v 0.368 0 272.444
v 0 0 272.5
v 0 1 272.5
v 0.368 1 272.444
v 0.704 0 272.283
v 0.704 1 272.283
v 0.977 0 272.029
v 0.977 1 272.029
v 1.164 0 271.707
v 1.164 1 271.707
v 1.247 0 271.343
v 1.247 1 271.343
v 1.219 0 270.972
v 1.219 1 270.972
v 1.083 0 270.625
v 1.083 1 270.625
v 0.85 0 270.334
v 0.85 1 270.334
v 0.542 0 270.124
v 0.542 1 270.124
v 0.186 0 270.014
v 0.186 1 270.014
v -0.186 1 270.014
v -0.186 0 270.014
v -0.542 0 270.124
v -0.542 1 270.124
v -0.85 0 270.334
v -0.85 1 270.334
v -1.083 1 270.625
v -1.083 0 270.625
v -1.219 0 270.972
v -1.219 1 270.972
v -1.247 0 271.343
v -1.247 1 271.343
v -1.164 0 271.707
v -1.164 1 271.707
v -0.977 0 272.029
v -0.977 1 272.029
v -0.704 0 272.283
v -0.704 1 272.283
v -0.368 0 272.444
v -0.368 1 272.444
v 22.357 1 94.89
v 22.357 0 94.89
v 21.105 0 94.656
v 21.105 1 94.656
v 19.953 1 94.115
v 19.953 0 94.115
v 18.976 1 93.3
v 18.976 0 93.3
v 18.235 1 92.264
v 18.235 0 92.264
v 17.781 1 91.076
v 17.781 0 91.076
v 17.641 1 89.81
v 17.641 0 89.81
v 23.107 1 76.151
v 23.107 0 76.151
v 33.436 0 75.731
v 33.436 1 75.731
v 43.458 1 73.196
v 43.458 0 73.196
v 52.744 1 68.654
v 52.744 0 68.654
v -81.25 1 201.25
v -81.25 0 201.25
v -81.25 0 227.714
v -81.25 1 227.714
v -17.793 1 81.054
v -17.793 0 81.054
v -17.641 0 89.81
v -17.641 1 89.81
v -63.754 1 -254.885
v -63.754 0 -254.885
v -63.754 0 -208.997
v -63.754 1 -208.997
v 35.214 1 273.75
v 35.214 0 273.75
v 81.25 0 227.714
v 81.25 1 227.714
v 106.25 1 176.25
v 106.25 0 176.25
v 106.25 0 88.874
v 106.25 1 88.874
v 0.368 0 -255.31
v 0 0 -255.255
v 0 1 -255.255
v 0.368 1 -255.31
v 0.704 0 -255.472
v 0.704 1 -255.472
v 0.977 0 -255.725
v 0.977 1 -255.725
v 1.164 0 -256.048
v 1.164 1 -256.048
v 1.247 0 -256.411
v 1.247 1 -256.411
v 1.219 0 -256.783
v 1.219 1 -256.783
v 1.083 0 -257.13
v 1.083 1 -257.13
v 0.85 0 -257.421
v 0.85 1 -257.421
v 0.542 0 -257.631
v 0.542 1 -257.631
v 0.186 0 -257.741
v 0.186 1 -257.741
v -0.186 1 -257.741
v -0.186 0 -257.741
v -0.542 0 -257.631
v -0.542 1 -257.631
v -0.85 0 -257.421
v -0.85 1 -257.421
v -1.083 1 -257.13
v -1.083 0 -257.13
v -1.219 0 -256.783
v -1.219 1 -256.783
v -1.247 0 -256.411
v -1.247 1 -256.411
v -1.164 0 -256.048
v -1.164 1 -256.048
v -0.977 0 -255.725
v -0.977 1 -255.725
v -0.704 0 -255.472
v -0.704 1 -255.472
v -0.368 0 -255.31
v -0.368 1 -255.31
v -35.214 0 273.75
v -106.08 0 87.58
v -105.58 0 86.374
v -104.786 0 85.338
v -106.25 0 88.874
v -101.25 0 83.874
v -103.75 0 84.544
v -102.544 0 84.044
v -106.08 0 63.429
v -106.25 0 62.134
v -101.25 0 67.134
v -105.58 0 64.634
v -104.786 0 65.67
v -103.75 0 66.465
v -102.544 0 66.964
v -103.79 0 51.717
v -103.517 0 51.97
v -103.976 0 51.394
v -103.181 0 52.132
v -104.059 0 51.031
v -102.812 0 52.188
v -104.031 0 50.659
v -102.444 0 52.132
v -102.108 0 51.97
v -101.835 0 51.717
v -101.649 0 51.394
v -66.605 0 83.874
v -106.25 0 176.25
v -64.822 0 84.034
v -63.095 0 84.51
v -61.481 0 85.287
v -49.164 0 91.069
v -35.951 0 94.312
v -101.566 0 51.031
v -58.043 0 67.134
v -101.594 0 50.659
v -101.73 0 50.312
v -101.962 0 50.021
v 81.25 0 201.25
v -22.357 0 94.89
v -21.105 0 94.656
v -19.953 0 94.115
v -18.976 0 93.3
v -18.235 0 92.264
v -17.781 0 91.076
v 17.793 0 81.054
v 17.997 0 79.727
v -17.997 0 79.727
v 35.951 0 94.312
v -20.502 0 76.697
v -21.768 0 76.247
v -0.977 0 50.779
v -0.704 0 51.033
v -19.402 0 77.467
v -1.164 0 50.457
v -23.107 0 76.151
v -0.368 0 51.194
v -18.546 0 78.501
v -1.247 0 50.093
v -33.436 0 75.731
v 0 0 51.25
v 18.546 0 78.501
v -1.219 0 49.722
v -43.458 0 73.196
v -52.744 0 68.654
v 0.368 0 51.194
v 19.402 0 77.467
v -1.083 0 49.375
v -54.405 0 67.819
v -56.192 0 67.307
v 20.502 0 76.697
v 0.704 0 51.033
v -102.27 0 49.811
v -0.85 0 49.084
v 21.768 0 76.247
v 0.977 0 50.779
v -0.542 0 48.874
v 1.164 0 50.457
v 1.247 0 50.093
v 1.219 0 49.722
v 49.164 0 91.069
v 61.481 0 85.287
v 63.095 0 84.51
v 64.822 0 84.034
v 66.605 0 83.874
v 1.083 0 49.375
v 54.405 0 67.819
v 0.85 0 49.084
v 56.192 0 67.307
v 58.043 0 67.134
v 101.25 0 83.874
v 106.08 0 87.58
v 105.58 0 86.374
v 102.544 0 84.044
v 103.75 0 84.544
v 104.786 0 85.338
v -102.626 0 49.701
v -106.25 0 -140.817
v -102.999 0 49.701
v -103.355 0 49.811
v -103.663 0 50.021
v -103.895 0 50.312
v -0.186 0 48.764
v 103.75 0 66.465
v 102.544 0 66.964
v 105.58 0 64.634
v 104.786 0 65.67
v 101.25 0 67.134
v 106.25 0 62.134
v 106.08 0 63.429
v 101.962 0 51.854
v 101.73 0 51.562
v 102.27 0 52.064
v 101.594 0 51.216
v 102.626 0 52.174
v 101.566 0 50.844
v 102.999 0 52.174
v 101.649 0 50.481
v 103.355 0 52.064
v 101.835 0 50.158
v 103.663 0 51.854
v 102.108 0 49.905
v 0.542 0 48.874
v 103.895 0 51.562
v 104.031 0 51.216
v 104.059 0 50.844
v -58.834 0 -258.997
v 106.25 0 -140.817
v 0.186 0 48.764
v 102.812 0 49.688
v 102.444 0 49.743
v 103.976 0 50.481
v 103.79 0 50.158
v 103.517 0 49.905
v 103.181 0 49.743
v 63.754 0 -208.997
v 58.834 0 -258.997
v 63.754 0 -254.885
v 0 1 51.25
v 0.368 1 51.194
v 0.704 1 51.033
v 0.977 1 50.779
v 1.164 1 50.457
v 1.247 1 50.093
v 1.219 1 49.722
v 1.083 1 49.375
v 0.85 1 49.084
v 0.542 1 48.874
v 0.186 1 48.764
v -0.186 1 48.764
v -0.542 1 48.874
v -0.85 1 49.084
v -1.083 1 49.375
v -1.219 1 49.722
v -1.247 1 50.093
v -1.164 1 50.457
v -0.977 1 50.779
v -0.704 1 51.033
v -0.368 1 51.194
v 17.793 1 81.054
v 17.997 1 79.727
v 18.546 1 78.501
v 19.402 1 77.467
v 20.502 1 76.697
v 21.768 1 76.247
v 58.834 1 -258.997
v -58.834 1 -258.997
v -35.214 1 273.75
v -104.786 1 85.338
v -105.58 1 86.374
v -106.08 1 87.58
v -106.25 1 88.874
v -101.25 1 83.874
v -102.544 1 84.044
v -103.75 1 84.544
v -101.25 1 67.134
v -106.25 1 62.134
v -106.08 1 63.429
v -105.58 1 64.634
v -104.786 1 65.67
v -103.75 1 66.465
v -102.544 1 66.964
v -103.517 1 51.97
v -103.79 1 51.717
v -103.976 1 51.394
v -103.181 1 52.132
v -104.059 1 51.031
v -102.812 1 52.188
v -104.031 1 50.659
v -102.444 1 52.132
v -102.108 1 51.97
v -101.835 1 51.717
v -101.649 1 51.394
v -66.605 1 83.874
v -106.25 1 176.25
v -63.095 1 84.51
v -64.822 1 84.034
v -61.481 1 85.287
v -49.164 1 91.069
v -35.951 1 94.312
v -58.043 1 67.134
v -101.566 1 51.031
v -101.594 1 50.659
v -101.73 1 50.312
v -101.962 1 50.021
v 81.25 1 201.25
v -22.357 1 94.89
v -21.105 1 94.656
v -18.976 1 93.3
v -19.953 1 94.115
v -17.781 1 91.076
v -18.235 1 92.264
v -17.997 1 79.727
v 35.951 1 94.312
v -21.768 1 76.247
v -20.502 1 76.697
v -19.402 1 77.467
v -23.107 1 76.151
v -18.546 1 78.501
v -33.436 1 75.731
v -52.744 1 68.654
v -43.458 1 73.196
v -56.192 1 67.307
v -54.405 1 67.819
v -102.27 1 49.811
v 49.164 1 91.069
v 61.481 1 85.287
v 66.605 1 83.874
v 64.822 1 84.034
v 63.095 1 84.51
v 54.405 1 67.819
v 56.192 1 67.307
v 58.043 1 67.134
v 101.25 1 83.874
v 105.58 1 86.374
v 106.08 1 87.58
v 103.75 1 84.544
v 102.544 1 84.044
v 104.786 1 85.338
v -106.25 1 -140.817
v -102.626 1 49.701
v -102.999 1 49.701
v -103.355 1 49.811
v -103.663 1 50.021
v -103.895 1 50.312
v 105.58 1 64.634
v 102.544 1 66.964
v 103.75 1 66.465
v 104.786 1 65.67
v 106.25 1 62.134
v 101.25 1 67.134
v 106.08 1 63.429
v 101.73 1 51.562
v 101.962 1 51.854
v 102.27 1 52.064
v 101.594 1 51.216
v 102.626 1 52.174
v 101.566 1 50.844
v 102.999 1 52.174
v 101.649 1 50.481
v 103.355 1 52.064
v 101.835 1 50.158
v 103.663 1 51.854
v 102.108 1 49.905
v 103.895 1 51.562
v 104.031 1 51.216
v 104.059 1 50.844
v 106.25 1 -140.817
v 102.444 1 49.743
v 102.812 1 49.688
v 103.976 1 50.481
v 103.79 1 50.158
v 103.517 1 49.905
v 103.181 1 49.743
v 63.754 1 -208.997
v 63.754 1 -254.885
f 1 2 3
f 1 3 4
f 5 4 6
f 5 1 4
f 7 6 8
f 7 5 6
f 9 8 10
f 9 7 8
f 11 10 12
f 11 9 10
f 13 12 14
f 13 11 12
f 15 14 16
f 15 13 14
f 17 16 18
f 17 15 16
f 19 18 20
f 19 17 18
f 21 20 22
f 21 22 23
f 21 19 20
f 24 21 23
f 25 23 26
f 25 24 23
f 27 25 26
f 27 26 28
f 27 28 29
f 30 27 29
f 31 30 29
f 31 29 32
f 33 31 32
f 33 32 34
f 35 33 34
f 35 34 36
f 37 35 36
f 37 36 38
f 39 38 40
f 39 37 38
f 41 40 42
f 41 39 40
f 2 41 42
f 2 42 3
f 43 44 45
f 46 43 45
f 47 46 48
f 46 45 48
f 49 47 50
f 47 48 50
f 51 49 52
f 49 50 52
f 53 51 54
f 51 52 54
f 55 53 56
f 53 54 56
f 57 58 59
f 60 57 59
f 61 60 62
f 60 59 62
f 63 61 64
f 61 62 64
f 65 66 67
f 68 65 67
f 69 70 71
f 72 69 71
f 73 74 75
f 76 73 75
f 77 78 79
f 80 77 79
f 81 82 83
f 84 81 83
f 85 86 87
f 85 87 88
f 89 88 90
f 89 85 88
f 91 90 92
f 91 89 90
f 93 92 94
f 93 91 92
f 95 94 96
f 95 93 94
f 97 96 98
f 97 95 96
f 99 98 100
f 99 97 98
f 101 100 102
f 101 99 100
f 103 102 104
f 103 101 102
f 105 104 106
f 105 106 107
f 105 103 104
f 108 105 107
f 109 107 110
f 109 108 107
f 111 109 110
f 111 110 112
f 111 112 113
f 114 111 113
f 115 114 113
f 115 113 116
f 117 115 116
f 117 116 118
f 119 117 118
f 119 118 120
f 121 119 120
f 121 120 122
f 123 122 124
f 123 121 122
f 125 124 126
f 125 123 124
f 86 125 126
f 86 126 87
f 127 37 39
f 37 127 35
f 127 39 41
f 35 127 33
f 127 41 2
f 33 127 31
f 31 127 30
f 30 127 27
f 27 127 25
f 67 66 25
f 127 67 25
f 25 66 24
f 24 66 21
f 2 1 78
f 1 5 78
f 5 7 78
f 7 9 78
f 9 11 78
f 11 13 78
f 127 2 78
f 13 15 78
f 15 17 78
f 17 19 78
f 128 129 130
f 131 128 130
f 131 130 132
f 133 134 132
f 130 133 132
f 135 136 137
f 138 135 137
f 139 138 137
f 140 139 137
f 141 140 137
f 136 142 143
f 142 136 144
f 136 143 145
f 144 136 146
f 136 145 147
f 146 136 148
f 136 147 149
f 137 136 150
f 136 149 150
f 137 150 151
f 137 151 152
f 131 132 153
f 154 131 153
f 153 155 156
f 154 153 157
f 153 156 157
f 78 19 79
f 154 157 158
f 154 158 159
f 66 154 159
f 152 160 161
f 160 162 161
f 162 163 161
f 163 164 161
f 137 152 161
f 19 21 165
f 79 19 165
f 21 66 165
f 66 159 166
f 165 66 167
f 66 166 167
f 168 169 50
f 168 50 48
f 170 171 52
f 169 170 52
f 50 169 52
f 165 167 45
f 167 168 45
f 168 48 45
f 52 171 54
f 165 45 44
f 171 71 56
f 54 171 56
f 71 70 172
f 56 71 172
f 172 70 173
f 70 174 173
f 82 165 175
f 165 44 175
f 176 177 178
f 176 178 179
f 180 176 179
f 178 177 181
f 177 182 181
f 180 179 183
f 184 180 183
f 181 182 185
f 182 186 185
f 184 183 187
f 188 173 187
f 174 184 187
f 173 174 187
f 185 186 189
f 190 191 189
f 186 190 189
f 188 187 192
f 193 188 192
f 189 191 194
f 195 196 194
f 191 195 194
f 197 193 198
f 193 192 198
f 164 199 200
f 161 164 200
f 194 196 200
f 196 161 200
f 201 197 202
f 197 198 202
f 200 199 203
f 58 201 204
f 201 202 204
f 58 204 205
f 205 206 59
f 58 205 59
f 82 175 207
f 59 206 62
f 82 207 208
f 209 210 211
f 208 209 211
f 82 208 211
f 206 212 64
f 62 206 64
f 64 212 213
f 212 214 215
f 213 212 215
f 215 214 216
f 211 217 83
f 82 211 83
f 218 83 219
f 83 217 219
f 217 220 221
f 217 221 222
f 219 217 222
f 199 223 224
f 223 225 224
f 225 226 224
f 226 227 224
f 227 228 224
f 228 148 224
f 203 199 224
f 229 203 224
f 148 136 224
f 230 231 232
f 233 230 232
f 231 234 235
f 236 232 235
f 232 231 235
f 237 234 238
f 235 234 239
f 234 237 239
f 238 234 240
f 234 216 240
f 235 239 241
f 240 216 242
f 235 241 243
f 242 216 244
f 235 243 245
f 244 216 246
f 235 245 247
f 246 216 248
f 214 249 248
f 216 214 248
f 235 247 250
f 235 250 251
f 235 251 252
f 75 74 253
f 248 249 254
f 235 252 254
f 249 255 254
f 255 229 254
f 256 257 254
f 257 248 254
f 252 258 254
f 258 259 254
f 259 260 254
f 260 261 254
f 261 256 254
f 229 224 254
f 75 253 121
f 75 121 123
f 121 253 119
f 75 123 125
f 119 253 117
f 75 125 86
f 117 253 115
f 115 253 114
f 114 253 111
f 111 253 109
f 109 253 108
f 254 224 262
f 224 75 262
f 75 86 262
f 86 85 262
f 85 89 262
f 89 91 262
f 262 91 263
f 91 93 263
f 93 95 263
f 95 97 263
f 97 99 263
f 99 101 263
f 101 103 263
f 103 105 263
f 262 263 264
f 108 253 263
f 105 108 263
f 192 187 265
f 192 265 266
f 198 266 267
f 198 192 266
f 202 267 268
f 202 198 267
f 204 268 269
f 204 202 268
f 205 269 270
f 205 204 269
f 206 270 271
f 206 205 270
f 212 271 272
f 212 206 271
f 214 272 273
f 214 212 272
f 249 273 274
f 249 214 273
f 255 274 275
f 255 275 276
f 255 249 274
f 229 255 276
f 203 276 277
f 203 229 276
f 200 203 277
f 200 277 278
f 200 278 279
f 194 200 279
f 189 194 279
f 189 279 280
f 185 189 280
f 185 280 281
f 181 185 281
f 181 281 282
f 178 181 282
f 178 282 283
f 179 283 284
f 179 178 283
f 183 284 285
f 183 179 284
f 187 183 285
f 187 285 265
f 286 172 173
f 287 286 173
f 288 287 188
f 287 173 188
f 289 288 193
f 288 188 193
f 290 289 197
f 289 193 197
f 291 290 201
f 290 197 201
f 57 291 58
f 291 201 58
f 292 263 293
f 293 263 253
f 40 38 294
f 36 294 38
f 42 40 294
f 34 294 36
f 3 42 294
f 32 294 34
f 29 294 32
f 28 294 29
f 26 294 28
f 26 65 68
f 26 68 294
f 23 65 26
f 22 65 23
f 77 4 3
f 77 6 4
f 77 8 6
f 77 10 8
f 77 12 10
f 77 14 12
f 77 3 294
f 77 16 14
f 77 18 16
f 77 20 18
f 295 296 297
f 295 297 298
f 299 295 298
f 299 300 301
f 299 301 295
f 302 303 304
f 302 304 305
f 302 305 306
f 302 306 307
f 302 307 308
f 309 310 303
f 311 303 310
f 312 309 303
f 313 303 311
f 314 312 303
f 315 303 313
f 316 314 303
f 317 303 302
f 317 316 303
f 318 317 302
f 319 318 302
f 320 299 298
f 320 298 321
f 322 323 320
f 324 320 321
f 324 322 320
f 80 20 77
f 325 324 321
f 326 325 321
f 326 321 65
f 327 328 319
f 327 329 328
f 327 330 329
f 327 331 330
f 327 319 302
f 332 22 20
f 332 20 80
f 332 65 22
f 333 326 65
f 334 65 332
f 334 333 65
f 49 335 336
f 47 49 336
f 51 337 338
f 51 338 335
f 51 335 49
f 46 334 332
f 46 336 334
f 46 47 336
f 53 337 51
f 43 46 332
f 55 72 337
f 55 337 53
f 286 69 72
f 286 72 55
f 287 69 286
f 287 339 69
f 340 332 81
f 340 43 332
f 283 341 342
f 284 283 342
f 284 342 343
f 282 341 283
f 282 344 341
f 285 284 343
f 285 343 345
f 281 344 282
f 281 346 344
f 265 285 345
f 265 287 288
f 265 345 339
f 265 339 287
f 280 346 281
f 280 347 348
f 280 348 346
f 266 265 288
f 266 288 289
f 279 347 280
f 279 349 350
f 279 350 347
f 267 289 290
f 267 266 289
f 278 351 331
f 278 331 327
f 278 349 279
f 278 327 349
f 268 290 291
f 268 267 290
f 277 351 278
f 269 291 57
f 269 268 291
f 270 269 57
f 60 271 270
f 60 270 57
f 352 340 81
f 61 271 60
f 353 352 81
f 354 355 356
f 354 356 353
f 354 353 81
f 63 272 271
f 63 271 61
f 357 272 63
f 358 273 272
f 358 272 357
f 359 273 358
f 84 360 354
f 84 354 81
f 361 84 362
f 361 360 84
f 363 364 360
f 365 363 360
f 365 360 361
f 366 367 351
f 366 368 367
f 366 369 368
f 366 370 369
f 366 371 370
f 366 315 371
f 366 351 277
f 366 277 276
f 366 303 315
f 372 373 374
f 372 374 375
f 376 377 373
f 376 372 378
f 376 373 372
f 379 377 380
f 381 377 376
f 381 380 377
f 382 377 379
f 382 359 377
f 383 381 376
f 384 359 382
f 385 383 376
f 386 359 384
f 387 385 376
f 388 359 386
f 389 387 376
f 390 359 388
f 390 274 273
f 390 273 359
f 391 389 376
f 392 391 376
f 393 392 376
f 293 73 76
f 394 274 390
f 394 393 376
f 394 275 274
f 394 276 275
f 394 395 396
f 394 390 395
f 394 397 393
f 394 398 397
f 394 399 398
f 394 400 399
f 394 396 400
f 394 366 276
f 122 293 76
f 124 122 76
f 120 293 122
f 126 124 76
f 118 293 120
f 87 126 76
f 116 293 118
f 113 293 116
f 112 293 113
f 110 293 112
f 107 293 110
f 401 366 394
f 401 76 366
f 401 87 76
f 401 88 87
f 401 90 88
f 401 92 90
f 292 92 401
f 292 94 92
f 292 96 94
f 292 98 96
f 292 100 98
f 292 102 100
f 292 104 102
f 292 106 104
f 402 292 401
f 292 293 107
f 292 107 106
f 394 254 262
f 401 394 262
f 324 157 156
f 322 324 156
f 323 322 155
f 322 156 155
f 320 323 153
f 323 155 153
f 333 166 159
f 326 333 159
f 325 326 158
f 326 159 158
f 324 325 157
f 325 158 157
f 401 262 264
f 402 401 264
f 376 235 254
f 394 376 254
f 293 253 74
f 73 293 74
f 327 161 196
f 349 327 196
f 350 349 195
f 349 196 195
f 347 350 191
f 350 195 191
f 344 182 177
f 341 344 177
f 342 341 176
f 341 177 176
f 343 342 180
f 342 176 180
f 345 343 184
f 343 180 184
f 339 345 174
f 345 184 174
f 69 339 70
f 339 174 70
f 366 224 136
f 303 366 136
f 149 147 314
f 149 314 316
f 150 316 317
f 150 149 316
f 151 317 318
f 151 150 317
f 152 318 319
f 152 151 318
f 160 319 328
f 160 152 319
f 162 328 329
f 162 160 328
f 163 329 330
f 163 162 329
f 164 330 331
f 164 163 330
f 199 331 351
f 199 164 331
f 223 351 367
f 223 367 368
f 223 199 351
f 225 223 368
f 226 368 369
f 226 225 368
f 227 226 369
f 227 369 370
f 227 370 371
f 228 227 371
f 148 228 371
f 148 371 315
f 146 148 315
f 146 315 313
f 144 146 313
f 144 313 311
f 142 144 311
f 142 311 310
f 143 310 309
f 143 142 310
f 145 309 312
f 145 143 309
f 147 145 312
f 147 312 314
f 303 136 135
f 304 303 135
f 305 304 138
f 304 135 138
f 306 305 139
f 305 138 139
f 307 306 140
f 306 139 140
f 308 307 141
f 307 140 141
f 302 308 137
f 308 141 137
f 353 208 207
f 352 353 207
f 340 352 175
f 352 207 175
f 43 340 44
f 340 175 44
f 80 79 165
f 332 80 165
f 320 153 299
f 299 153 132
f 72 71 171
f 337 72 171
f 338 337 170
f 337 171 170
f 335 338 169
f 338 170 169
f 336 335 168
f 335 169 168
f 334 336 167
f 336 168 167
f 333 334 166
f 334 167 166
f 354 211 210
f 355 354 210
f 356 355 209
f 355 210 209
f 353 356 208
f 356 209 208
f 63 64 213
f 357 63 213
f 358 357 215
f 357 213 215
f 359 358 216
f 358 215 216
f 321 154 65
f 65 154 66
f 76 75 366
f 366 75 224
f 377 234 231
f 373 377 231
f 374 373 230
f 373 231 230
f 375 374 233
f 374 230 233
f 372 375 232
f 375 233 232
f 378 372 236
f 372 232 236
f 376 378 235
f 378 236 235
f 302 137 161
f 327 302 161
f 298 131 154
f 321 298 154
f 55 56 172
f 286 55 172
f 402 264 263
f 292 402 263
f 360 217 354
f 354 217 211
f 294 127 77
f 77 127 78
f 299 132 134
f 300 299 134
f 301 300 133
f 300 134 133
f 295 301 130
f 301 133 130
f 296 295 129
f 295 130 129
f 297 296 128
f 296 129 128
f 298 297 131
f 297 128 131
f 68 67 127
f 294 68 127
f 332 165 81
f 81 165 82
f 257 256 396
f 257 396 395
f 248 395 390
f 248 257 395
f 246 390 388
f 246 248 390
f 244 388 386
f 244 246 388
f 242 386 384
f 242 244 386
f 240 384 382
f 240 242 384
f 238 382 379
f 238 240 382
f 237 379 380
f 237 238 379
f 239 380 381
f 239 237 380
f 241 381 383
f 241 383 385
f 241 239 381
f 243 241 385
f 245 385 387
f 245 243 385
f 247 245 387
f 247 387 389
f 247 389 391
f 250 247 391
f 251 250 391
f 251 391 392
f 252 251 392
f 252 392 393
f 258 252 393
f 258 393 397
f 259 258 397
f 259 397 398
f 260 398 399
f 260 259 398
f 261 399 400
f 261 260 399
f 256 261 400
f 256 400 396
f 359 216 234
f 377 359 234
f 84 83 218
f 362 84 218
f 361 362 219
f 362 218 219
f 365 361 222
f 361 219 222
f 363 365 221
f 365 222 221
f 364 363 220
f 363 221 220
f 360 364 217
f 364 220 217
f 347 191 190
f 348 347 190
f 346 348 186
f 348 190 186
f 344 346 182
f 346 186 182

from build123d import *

# Parameters (mm, degrees)
SKETCH1_R           = 1.25
BOSS_EXTRUDE1_DEPTH = 1


with BuildPart() as part:
    # Sketch1 → Boss-Extrude1 (new body)
    with BuildSketch(Plane(origin=(0, 0, 0), x_dir=(1, 0, 0), z_dir=(0, 1, 0))):
        with BuildLine():
            Line((-35.214466094, -273.75), (35.214466094, -273.75))
            Line((35.214466094, -273.75), (81.25, -227.714466094))
            Line((81.25, -227.714466094), (81.25, -201.25))
            Line((81.25, -201.25), (106.25, -176.25))
            Line((106.25, -176.25), (106.25, -88.874002831))
            ThreePointArc((106.25, -88.874002831), (104.785533906, -85.338468925), (101.25, -83.874002831))
            Line((101.25, -83.874002831), (66.605380572, -83.874002831))
            ThreePointArc((66.605380572, -83.874002831), (63.947538367, -84.23367738), (61.480887801, -85.286827869))
            ThreePointArc((61.480887801, -85.286827869), (42.637913048, -93.018246989), (22.356633062, -94.889669244))
            ThreePointArc((22.356633062, -94.889669244), (18.9756934, -93.299812922), (17.640548545, -89.810431267))
            Line((17.640548545, -89.810431267), (17.793393264, -81.053963175))
            ThreePointArc((17.793393264, -81.053963175), (19.401963586, -77.466532095), (23.106937946, -76.151113824))
            ThreePointArc((23.106937946, -76.151113824), (38.512493282, -74.722995147), (52.743936183, -68.653671368))
            ThreePointArc((52.743936183, -68.653671368), (55.286579623, -67.521722803), (58.04272342, -67.134405642))
            Line((58.04272342, -67.134405642), (101.25, -67.134405642))
            ThreePointArc((101.25, -67.134405642), (104.785533906, -65.669939548), (106.25, -62.134405642))
            Line((106.25, -62.134405642), (106.25, 140.817393532))
            Line((106.25, 140.817393532), (63.754385783, 208.997474683))
            Line((63.754385783, 208.997474683), (63.754385783, 254.885164258))
            Line((63.754385783, 254.885164258), (58.833815977, 258.997474683))
            Line((58.833815977, 258.997474683), (-58.833815977, 258.997474683))
            Line((-58.833815977, 258.997474683), (-63.754385783, 254.885164258))
            Line((-63.754385783, 254.885164258), (-63.754385783, 208.997474683))
            Line((-63.754385783, 208.997474683), (-106.25, 140.817393532))
            Line((-106.25, 140.817393532), (-106.25, -62.134405642))
            ThreePointArc((-106.25, -62.134405642), (-104.785533906, -65.669939548), (-101.25, -67.134405642))
            Line((-101.25, -67.134405642), (-58.04272342, -67.134405642))
            ThreePointArc((-58.04272342, -67.134405642), (-55.286579623, -67.521722803), (-52.743936183, -68.653671368))
            ThreePointArc((-52.743936183, -68.653671368), (-38.512493282, -74.722995147), (-23.106937946, -76.151113824))
            ThreePointArc((-23.106937946, -76.151113824), (-19.401963586, -77.466532095), (-17.793393264, -81.053963175))
            Line((-17.793393264, -81.053963175), (-17.640548545, -89.810431267))
            ThreePointArc((-17.640548545, -89.810431267), (-18.9756934, -93.299812922), (-22.356633062, -94.889669244))
            ThreePointArc((-22.356633062, -94.889669244), (-42.637913048, -93.018246989), (-61.480887801, -85.286827869))
            ThreePointArc((-61.480887801, -85.286827869), (-63.947538367, -84.23367738), (-66.605380572, -83.874002831))
            Line((-66.605380572, -83.874002831), (-101.25, -83.874002831))
            ThreePointArc((-101.25, -83.874002831), (-104.785533906, -85.338468925), (-106.25, -88.874002831))
            Line((-106.25, -88.874002831), (-106.25, -176.25))
            Line((-106.25, -176.25), (-81.25, -201.25))
            Line((-81.25, -201.25), (-81.25, -227.714466094))
            Line((-81.25, -227.714466094), (-35.214466094, -273.75))
        make_face()
        with Locations((0, 256.50465463)):
            Circle(SKETCH1_R, mode=Mode.SUBTRACT)
        with Locations((-102.8125, -50.9375)):
            Circle(SKETCH1_R, mode=Mode.SUBTRACT)
        with Locations((0, -50)):
            Circle(SKETCH1_R, mode=Mode.SUBTRACT)
        with Locations((0, -271.25)):
            Circle(SKETCH1_R, mode=Mode.SUBTRACT)
        with Locations((102.8125, -50.9375)):
            Circle(SKETCH1_R, mode=Mode.SUBTRACT)
    extrude(amount=BOSS_EXTRUDE1_DEPTH)


solid = part.part
